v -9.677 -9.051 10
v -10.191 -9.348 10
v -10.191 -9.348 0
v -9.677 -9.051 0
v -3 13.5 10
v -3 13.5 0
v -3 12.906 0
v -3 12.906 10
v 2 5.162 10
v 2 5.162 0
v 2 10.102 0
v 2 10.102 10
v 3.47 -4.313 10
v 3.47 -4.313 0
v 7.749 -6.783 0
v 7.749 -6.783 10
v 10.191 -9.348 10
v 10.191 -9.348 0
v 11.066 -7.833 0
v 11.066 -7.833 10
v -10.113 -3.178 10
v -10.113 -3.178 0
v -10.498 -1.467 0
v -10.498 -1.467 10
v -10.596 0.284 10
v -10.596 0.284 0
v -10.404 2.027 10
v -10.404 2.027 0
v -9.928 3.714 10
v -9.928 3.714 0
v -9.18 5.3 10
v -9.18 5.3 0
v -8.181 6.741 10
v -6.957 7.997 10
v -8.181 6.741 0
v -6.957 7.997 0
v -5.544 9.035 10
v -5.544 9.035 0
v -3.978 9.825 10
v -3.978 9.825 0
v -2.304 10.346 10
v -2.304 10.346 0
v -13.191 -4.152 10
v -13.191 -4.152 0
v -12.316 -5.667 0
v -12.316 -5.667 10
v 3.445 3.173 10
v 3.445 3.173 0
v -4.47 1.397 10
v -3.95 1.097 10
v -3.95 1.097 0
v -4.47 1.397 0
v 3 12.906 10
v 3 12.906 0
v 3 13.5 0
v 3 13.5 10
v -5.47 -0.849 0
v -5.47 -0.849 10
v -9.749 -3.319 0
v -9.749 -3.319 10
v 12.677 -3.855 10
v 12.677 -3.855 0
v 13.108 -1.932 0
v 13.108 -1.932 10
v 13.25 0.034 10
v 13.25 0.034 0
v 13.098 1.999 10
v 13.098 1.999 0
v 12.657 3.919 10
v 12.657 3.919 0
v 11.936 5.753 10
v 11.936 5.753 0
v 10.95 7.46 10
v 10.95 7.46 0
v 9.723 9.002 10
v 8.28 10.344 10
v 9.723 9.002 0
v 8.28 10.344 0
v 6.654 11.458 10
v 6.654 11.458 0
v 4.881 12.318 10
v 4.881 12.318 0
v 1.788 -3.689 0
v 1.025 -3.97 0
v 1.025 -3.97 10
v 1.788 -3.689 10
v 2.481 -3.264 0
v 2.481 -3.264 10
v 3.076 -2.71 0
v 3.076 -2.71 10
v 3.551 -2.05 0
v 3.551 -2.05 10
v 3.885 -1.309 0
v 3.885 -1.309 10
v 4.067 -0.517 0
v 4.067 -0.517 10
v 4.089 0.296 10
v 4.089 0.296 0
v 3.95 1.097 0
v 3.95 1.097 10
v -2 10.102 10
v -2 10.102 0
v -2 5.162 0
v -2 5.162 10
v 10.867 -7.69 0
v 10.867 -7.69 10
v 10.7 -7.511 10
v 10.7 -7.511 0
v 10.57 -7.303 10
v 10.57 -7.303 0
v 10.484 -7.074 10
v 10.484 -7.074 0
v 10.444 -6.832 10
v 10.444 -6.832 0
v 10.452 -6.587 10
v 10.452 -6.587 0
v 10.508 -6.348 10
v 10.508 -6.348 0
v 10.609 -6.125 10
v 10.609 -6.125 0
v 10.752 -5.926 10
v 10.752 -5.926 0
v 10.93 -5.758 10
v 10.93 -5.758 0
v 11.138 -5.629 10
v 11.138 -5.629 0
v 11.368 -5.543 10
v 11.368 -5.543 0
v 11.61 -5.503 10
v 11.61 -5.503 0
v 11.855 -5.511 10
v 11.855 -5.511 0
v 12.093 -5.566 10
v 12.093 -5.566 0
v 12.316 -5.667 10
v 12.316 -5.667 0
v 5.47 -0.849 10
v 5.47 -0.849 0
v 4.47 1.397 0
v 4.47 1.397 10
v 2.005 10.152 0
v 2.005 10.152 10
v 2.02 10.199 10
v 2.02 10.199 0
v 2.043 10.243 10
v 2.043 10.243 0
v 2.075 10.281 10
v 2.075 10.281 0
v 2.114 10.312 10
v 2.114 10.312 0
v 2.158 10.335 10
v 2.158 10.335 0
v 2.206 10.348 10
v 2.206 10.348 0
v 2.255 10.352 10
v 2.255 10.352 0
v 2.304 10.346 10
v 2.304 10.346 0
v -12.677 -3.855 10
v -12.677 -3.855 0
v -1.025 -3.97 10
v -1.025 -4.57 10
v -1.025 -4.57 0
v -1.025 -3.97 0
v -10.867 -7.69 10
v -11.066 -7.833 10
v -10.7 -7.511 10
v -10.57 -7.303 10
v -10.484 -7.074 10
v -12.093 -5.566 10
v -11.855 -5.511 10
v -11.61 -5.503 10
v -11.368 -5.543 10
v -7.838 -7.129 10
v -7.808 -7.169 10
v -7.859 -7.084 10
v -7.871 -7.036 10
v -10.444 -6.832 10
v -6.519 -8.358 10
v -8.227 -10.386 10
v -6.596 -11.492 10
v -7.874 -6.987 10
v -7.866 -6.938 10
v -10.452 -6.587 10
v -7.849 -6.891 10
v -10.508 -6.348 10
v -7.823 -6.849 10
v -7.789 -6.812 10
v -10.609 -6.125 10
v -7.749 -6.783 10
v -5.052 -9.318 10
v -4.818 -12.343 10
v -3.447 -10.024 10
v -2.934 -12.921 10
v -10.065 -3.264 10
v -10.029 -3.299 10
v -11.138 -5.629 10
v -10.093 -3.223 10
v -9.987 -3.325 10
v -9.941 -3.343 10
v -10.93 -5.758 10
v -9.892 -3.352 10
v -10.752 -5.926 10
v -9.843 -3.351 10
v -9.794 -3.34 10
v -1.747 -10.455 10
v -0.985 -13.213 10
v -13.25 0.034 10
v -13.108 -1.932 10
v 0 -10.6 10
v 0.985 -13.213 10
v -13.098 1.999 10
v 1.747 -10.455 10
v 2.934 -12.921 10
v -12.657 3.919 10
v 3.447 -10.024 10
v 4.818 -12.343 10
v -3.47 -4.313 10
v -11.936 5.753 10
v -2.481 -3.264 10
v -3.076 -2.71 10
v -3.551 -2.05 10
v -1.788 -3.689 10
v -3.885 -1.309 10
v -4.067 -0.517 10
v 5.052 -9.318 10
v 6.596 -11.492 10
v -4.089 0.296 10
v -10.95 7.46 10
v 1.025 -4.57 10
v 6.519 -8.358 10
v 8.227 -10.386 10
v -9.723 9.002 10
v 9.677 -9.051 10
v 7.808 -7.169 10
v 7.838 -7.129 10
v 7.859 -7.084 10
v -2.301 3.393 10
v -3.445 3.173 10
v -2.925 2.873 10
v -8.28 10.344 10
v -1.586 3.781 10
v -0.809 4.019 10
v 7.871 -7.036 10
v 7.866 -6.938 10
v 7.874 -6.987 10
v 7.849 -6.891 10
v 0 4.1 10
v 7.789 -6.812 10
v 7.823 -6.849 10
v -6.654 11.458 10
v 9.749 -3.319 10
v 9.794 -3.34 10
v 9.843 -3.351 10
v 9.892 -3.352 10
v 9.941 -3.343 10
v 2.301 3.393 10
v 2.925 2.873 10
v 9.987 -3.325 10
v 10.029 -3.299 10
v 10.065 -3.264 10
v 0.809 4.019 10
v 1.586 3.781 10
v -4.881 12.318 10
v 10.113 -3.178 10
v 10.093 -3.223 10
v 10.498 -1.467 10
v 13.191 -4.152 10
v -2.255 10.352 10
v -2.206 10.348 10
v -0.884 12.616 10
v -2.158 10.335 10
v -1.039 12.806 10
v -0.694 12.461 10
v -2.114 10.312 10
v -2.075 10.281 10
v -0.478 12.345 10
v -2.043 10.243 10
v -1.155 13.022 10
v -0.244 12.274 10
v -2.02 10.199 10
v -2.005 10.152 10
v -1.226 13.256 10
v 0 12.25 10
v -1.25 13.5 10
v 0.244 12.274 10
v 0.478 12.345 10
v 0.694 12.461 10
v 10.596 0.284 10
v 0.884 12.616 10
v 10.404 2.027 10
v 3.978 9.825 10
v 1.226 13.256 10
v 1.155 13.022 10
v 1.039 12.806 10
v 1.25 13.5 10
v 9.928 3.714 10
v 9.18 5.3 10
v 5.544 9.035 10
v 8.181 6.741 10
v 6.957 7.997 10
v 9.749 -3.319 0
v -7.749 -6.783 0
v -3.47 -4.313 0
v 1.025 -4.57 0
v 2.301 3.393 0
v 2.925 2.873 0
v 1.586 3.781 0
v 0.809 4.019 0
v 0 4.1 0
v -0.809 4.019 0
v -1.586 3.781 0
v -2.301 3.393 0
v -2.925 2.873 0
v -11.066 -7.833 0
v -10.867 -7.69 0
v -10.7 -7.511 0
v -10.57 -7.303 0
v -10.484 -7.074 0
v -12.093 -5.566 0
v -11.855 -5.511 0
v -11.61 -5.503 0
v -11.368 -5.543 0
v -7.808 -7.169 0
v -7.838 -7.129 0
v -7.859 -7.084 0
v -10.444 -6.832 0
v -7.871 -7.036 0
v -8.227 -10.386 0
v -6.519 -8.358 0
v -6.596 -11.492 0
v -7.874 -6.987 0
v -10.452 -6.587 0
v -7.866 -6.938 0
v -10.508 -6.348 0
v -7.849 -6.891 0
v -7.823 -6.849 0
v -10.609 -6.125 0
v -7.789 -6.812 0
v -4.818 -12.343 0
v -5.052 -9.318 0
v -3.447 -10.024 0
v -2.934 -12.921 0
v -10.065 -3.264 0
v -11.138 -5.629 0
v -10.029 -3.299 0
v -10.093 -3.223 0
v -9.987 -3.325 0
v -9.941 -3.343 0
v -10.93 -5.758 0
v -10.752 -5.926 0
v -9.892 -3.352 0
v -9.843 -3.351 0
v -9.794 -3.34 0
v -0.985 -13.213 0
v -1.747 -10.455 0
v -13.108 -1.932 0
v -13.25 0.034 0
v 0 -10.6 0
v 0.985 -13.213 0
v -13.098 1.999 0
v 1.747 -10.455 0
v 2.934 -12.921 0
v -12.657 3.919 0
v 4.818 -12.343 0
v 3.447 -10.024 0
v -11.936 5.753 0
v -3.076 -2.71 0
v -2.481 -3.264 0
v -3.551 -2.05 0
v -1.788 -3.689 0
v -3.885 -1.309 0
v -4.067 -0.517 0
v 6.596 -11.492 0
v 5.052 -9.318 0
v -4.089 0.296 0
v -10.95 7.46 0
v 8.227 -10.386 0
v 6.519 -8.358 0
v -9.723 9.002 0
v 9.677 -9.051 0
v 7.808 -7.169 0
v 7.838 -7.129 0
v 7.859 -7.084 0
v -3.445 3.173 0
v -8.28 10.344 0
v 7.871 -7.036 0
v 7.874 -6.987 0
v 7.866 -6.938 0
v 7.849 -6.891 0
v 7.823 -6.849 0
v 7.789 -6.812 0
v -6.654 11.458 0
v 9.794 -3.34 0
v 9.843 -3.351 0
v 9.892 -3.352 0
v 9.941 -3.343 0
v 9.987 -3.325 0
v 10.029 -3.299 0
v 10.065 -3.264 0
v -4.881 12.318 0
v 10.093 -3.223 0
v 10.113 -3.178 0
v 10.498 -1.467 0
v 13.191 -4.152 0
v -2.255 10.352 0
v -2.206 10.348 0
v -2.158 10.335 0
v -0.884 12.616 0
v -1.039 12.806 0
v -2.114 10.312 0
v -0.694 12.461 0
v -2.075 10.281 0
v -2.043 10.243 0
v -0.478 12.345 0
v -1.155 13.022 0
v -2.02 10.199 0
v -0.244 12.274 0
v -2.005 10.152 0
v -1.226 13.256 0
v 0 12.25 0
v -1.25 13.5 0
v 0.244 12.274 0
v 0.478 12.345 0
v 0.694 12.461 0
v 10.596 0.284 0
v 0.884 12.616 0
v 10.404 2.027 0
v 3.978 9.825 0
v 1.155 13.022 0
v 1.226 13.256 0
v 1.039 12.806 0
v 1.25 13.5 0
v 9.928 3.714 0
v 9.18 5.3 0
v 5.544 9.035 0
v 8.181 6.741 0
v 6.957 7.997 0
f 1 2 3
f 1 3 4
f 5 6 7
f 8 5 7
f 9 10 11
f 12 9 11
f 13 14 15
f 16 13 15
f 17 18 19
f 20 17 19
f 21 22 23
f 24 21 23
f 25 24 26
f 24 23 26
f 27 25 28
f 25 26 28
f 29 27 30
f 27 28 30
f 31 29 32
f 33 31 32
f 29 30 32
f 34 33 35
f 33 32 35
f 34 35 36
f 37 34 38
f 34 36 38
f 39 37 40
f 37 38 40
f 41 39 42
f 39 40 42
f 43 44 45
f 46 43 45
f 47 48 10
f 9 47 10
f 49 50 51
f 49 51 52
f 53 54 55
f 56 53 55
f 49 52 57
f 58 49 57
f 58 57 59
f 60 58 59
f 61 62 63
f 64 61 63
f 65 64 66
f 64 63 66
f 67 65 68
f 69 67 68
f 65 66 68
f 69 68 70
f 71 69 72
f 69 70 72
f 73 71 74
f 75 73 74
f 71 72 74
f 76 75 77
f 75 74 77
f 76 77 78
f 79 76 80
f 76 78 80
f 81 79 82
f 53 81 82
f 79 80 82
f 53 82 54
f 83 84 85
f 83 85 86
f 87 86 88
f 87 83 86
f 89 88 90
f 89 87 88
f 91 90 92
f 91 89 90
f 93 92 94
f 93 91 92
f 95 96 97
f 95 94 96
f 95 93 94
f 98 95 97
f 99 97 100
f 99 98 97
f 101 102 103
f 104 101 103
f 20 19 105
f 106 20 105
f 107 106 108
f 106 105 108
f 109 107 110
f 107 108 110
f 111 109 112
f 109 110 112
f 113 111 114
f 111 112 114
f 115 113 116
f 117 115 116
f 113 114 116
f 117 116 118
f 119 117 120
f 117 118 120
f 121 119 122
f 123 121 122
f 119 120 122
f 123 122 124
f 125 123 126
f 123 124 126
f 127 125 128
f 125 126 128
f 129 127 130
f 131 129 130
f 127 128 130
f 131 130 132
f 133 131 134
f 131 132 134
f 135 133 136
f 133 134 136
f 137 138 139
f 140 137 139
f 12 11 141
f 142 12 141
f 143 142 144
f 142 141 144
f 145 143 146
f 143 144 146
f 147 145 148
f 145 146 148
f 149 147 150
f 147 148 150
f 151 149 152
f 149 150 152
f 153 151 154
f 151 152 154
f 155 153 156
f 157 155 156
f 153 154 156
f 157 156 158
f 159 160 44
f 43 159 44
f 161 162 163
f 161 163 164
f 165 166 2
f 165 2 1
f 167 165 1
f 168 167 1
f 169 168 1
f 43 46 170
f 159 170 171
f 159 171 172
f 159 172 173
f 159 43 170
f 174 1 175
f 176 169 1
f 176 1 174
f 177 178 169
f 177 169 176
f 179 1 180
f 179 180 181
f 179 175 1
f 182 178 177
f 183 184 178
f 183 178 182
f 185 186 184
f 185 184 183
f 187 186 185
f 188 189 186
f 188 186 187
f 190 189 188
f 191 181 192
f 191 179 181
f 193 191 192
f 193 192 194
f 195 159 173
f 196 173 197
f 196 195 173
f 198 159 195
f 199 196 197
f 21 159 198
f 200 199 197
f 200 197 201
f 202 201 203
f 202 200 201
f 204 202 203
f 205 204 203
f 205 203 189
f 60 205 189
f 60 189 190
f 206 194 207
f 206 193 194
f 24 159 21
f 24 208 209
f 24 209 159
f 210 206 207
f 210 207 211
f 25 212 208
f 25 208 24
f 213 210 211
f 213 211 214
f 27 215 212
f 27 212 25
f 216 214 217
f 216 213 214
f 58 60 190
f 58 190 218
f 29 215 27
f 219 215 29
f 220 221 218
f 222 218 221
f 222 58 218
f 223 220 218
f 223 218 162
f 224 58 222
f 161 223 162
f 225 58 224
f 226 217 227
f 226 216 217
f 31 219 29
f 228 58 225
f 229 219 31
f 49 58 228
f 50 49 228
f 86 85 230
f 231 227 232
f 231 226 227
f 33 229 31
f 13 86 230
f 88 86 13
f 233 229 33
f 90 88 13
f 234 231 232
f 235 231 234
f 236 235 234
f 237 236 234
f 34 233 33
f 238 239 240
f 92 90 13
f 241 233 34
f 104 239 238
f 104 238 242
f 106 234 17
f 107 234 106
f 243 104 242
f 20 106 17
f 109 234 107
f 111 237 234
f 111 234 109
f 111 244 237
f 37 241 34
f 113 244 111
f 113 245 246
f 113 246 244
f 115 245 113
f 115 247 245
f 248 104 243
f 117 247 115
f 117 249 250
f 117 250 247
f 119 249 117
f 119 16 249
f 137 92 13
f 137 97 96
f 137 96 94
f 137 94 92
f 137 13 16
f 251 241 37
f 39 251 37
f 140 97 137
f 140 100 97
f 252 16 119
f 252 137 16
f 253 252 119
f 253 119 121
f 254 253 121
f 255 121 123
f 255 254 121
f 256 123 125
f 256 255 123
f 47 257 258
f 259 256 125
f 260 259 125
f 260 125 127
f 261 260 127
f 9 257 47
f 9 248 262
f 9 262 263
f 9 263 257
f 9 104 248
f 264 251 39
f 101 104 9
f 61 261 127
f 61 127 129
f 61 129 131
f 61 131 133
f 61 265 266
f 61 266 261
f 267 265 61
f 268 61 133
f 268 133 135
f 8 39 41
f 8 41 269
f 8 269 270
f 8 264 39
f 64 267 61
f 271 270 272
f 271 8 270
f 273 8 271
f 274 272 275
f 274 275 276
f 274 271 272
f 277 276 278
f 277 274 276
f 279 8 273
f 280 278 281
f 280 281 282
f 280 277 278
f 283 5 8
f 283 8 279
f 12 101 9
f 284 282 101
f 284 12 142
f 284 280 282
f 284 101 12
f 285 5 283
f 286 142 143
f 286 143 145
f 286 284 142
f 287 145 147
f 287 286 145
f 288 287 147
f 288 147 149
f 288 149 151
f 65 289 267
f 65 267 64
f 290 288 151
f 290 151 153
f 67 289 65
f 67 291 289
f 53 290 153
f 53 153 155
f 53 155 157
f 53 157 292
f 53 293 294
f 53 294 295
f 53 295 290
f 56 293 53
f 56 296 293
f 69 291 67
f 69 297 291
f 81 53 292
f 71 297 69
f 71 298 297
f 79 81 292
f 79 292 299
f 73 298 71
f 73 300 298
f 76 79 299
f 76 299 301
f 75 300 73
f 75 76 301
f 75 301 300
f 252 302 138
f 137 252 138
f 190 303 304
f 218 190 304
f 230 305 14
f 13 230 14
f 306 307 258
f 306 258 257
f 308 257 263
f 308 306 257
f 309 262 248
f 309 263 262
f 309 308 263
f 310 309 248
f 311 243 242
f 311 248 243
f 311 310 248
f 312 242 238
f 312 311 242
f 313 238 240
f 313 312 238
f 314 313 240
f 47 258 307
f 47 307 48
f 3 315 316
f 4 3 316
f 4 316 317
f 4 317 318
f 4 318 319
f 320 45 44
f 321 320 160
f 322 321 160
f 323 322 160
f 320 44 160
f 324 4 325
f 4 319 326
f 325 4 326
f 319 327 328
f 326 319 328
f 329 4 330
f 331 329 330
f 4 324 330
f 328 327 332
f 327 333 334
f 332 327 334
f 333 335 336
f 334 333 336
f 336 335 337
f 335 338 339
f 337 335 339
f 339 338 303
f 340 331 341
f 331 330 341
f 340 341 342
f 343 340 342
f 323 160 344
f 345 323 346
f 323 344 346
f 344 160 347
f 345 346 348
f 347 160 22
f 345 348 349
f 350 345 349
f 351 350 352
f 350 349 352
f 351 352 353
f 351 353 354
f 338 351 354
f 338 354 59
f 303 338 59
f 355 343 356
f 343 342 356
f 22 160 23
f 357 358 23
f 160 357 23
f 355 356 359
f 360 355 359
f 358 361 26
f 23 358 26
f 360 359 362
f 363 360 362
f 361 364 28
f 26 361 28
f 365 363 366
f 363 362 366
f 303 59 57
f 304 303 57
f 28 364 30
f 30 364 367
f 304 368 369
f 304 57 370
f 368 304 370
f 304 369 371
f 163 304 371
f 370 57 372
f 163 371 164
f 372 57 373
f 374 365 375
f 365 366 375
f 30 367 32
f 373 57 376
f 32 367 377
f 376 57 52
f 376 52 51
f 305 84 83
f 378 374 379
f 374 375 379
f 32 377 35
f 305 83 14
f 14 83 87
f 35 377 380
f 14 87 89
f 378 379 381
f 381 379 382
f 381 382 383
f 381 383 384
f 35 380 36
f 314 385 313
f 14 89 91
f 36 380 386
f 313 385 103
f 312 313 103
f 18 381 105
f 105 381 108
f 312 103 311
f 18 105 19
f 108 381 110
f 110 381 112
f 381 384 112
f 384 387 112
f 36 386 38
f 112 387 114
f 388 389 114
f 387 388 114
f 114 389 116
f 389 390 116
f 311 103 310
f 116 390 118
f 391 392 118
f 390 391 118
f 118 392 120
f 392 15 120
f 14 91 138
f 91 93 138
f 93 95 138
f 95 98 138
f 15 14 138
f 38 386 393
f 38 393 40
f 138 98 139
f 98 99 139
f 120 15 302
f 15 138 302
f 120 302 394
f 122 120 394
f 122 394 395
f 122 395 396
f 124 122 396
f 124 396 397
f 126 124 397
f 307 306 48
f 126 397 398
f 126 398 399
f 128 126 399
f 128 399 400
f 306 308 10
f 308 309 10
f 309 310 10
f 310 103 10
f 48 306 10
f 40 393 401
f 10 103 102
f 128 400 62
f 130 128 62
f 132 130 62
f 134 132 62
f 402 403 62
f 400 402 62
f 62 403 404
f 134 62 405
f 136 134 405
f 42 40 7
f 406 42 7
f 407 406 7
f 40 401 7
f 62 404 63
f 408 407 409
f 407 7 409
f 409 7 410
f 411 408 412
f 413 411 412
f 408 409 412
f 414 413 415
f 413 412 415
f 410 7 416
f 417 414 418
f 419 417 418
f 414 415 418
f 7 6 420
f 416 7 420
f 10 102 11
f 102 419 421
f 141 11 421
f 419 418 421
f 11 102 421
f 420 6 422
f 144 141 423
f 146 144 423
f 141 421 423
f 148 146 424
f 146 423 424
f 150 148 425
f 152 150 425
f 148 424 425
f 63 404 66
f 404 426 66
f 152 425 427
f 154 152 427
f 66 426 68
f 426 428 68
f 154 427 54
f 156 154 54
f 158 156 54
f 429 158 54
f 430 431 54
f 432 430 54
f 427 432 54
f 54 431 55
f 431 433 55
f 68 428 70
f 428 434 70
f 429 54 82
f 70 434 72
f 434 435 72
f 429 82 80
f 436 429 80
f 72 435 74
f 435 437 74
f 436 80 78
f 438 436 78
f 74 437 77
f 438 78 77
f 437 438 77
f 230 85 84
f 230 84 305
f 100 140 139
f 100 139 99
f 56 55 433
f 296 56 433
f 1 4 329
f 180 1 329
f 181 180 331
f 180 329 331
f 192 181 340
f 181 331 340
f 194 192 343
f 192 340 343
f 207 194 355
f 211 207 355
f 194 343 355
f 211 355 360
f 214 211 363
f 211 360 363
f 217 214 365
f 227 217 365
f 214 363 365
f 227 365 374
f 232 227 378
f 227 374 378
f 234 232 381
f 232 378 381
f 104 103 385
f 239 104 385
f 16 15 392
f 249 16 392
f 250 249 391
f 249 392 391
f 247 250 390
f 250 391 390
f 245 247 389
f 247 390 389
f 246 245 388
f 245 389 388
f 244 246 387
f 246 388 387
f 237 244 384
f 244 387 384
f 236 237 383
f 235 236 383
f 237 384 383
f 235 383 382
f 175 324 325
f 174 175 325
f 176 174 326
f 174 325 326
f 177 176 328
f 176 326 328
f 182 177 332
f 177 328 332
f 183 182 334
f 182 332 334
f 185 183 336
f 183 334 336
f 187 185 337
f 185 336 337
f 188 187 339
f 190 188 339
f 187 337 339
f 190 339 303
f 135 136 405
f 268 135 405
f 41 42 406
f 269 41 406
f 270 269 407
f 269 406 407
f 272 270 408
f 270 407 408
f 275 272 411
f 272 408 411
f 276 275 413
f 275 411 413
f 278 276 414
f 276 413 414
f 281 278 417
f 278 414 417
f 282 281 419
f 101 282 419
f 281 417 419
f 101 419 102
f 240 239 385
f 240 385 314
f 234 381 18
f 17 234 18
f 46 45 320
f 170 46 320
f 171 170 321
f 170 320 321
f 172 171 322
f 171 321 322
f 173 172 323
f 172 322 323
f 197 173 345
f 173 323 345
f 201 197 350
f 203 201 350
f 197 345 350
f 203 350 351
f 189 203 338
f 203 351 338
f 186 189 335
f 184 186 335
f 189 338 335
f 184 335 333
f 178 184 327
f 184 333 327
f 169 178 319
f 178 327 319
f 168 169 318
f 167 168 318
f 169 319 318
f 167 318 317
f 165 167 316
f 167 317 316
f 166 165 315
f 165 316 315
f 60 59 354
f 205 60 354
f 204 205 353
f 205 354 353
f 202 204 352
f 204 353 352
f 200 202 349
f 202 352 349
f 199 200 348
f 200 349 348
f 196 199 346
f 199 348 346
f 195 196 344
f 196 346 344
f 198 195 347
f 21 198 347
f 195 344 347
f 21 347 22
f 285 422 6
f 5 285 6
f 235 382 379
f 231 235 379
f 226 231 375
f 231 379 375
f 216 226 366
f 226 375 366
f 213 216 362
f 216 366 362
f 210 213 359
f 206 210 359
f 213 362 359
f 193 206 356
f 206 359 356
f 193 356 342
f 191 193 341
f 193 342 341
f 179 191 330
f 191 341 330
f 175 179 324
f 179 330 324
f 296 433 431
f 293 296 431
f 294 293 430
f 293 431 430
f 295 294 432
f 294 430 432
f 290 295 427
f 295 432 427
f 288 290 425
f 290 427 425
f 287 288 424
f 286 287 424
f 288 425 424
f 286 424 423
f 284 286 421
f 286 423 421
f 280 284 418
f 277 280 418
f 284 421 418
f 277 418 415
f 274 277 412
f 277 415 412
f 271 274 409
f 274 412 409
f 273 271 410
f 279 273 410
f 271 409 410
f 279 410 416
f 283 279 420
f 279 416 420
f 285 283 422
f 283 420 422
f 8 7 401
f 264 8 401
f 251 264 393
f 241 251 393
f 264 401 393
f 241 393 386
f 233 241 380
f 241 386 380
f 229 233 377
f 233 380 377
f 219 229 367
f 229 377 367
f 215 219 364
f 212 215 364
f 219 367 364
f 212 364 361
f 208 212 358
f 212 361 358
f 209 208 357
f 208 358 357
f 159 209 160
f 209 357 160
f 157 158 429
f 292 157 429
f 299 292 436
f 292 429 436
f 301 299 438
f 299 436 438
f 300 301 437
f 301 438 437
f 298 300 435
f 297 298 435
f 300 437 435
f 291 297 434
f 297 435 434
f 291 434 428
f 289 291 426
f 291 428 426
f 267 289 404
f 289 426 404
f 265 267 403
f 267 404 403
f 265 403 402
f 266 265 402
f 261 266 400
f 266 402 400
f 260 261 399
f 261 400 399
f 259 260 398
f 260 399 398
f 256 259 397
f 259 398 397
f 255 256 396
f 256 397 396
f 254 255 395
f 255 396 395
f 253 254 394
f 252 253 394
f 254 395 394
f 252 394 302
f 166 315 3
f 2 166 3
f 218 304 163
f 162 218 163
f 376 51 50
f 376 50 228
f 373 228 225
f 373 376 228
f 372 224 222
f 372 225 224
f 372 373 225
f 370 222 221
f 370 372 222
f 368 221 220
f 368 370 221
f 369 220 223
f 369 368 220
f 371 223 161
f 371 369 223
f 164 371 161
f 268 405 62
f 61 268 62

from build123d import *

# Parameters (mm, degrees)
SKETCH_1_R               = 4.1
EXTRUDE_1_DEPTH          = 10
CUT_EXTRUDE_1_DEPTH      = 10
PATTERN_CIRCULAR_1_COUNT = 3


with BuildPart() as part:
    # 草图1 → 凸台-拉伸1 (new body)
    with BuildSketch(Plane.XY):
        with BuildLine():
            Line((-3, 13.5), (-3, 12.905909499))
            ThreePointArc((-3, 12.905909499), (-11.4748366, 6.625), (-12.676845485, -3.854878538))
            Line((-12.676845485, -3.854878538), (-13.191342951, -4.151923789))
            Line((-13.191342951, -4.151923789), (-12.316342951, -5.667468245))
            ThreePointArc((-12.316342951, -5.667468245), (-10.608811196, -6.125), (-11.066342951, -7.832531755))
            Line((-11.066342951, -7.832531755), (-10.191342951, -9.348076211))
            Line((-10.191342951, -9.348076211), (-9.676845485, -9.051030961))
            ThreePointArc((-9.676845485, -9.051030961), (0, -13.25), (9.676845485, -9.051030961))
            Line((9.676845485, -9.051030961), (10.191342951, -9.348076211))
            Line((10.191342951, -9.348076211), (11.066342951, -7.832531755))
            ThreePointArc((11.066342951, -7.832531755), (10.608811196, -6.125), (12.316342951, -5.667468245))
            Line((12.316342951, -5.667468245), (13.191342951, -4.151923789))
            Line((13.191342951, -4.151923789), (12.676845485, -3.854878538))
            ThreePointArc((12.676845485, -3.854878538), (11.4748366, 6.625), (3, 12.905909499))
            Line((3, 12.905909499), (3, 13.5))
            Line((3, 13.5), (1.25, 13.5))
            ThreePointArc((1.25, 13.5), (0, 12.25), (-1.25, 13.5))
            Line((-1.25, 13.5), (-3, 13.5))
        make_face()
        Circle(SKETCH_1_R, mode=Mode.SUBTRACT)
    extrude(amount=EXTRUDE_1_DEPTH)

    # 草图2 → 切除-拉伸1 (cut)
    with BuildSketch(Plane.XY):
        with BuildLine():
            Line((-7.748999943, -6.78328828), (-3.470031597, -4.312824754))
            Line((-3.470031597, -4.312824754), (-1.025, -4.56980793))
            Line((-1.025, -4.56980793), (-1.025, -3.96980793))
            ThreePointArc((-1.025, -3.96980793), (0, -4.1), (1.025, -3.96980793))
            Line((1.025, -3.96980793), (1.025, -4.56980793))
            Line((1.025, -4.56980793), (3.470031597, -4.312824754))
            Line((3.470031597, -4.312824754), (7.748999943, -6.78328828))
            ThreePointArc((7.748999943, -6.78328828), (7.871108829, -6.961884233), (7.808154531, -7.168871796))
            ThreePointArc((7.808154531, -7.168871796), (0, -10.6), (-7.808154531, -7.168871796))
            ThreePointArc((-7.808154531, -7.168871796), (-7.871108829, -6.961884233), (-7.748999943, -6.78328828))
        make_face()
    cut_extrude_1 = extrude(amount=CUT_EXTRUDE_1_DEPTH, mode=Mode.SUBTRACT)

    # 阵列(圆周)1: 切除-拉伸1 ×3 about axis
    pattern_circular_1_axis = Axis((0, 0, 0), (0, 0, 1))
    for i in range(1, PATTERN_CIRCULAR_1_COUNT):
        add(cut_extrude_1.rotate(pattern_circular_1_axis, i * 360 / PATTERN_CIRCULAR_1_COUNT), mode=Mode.SUBTRACT)


solid = part.part
